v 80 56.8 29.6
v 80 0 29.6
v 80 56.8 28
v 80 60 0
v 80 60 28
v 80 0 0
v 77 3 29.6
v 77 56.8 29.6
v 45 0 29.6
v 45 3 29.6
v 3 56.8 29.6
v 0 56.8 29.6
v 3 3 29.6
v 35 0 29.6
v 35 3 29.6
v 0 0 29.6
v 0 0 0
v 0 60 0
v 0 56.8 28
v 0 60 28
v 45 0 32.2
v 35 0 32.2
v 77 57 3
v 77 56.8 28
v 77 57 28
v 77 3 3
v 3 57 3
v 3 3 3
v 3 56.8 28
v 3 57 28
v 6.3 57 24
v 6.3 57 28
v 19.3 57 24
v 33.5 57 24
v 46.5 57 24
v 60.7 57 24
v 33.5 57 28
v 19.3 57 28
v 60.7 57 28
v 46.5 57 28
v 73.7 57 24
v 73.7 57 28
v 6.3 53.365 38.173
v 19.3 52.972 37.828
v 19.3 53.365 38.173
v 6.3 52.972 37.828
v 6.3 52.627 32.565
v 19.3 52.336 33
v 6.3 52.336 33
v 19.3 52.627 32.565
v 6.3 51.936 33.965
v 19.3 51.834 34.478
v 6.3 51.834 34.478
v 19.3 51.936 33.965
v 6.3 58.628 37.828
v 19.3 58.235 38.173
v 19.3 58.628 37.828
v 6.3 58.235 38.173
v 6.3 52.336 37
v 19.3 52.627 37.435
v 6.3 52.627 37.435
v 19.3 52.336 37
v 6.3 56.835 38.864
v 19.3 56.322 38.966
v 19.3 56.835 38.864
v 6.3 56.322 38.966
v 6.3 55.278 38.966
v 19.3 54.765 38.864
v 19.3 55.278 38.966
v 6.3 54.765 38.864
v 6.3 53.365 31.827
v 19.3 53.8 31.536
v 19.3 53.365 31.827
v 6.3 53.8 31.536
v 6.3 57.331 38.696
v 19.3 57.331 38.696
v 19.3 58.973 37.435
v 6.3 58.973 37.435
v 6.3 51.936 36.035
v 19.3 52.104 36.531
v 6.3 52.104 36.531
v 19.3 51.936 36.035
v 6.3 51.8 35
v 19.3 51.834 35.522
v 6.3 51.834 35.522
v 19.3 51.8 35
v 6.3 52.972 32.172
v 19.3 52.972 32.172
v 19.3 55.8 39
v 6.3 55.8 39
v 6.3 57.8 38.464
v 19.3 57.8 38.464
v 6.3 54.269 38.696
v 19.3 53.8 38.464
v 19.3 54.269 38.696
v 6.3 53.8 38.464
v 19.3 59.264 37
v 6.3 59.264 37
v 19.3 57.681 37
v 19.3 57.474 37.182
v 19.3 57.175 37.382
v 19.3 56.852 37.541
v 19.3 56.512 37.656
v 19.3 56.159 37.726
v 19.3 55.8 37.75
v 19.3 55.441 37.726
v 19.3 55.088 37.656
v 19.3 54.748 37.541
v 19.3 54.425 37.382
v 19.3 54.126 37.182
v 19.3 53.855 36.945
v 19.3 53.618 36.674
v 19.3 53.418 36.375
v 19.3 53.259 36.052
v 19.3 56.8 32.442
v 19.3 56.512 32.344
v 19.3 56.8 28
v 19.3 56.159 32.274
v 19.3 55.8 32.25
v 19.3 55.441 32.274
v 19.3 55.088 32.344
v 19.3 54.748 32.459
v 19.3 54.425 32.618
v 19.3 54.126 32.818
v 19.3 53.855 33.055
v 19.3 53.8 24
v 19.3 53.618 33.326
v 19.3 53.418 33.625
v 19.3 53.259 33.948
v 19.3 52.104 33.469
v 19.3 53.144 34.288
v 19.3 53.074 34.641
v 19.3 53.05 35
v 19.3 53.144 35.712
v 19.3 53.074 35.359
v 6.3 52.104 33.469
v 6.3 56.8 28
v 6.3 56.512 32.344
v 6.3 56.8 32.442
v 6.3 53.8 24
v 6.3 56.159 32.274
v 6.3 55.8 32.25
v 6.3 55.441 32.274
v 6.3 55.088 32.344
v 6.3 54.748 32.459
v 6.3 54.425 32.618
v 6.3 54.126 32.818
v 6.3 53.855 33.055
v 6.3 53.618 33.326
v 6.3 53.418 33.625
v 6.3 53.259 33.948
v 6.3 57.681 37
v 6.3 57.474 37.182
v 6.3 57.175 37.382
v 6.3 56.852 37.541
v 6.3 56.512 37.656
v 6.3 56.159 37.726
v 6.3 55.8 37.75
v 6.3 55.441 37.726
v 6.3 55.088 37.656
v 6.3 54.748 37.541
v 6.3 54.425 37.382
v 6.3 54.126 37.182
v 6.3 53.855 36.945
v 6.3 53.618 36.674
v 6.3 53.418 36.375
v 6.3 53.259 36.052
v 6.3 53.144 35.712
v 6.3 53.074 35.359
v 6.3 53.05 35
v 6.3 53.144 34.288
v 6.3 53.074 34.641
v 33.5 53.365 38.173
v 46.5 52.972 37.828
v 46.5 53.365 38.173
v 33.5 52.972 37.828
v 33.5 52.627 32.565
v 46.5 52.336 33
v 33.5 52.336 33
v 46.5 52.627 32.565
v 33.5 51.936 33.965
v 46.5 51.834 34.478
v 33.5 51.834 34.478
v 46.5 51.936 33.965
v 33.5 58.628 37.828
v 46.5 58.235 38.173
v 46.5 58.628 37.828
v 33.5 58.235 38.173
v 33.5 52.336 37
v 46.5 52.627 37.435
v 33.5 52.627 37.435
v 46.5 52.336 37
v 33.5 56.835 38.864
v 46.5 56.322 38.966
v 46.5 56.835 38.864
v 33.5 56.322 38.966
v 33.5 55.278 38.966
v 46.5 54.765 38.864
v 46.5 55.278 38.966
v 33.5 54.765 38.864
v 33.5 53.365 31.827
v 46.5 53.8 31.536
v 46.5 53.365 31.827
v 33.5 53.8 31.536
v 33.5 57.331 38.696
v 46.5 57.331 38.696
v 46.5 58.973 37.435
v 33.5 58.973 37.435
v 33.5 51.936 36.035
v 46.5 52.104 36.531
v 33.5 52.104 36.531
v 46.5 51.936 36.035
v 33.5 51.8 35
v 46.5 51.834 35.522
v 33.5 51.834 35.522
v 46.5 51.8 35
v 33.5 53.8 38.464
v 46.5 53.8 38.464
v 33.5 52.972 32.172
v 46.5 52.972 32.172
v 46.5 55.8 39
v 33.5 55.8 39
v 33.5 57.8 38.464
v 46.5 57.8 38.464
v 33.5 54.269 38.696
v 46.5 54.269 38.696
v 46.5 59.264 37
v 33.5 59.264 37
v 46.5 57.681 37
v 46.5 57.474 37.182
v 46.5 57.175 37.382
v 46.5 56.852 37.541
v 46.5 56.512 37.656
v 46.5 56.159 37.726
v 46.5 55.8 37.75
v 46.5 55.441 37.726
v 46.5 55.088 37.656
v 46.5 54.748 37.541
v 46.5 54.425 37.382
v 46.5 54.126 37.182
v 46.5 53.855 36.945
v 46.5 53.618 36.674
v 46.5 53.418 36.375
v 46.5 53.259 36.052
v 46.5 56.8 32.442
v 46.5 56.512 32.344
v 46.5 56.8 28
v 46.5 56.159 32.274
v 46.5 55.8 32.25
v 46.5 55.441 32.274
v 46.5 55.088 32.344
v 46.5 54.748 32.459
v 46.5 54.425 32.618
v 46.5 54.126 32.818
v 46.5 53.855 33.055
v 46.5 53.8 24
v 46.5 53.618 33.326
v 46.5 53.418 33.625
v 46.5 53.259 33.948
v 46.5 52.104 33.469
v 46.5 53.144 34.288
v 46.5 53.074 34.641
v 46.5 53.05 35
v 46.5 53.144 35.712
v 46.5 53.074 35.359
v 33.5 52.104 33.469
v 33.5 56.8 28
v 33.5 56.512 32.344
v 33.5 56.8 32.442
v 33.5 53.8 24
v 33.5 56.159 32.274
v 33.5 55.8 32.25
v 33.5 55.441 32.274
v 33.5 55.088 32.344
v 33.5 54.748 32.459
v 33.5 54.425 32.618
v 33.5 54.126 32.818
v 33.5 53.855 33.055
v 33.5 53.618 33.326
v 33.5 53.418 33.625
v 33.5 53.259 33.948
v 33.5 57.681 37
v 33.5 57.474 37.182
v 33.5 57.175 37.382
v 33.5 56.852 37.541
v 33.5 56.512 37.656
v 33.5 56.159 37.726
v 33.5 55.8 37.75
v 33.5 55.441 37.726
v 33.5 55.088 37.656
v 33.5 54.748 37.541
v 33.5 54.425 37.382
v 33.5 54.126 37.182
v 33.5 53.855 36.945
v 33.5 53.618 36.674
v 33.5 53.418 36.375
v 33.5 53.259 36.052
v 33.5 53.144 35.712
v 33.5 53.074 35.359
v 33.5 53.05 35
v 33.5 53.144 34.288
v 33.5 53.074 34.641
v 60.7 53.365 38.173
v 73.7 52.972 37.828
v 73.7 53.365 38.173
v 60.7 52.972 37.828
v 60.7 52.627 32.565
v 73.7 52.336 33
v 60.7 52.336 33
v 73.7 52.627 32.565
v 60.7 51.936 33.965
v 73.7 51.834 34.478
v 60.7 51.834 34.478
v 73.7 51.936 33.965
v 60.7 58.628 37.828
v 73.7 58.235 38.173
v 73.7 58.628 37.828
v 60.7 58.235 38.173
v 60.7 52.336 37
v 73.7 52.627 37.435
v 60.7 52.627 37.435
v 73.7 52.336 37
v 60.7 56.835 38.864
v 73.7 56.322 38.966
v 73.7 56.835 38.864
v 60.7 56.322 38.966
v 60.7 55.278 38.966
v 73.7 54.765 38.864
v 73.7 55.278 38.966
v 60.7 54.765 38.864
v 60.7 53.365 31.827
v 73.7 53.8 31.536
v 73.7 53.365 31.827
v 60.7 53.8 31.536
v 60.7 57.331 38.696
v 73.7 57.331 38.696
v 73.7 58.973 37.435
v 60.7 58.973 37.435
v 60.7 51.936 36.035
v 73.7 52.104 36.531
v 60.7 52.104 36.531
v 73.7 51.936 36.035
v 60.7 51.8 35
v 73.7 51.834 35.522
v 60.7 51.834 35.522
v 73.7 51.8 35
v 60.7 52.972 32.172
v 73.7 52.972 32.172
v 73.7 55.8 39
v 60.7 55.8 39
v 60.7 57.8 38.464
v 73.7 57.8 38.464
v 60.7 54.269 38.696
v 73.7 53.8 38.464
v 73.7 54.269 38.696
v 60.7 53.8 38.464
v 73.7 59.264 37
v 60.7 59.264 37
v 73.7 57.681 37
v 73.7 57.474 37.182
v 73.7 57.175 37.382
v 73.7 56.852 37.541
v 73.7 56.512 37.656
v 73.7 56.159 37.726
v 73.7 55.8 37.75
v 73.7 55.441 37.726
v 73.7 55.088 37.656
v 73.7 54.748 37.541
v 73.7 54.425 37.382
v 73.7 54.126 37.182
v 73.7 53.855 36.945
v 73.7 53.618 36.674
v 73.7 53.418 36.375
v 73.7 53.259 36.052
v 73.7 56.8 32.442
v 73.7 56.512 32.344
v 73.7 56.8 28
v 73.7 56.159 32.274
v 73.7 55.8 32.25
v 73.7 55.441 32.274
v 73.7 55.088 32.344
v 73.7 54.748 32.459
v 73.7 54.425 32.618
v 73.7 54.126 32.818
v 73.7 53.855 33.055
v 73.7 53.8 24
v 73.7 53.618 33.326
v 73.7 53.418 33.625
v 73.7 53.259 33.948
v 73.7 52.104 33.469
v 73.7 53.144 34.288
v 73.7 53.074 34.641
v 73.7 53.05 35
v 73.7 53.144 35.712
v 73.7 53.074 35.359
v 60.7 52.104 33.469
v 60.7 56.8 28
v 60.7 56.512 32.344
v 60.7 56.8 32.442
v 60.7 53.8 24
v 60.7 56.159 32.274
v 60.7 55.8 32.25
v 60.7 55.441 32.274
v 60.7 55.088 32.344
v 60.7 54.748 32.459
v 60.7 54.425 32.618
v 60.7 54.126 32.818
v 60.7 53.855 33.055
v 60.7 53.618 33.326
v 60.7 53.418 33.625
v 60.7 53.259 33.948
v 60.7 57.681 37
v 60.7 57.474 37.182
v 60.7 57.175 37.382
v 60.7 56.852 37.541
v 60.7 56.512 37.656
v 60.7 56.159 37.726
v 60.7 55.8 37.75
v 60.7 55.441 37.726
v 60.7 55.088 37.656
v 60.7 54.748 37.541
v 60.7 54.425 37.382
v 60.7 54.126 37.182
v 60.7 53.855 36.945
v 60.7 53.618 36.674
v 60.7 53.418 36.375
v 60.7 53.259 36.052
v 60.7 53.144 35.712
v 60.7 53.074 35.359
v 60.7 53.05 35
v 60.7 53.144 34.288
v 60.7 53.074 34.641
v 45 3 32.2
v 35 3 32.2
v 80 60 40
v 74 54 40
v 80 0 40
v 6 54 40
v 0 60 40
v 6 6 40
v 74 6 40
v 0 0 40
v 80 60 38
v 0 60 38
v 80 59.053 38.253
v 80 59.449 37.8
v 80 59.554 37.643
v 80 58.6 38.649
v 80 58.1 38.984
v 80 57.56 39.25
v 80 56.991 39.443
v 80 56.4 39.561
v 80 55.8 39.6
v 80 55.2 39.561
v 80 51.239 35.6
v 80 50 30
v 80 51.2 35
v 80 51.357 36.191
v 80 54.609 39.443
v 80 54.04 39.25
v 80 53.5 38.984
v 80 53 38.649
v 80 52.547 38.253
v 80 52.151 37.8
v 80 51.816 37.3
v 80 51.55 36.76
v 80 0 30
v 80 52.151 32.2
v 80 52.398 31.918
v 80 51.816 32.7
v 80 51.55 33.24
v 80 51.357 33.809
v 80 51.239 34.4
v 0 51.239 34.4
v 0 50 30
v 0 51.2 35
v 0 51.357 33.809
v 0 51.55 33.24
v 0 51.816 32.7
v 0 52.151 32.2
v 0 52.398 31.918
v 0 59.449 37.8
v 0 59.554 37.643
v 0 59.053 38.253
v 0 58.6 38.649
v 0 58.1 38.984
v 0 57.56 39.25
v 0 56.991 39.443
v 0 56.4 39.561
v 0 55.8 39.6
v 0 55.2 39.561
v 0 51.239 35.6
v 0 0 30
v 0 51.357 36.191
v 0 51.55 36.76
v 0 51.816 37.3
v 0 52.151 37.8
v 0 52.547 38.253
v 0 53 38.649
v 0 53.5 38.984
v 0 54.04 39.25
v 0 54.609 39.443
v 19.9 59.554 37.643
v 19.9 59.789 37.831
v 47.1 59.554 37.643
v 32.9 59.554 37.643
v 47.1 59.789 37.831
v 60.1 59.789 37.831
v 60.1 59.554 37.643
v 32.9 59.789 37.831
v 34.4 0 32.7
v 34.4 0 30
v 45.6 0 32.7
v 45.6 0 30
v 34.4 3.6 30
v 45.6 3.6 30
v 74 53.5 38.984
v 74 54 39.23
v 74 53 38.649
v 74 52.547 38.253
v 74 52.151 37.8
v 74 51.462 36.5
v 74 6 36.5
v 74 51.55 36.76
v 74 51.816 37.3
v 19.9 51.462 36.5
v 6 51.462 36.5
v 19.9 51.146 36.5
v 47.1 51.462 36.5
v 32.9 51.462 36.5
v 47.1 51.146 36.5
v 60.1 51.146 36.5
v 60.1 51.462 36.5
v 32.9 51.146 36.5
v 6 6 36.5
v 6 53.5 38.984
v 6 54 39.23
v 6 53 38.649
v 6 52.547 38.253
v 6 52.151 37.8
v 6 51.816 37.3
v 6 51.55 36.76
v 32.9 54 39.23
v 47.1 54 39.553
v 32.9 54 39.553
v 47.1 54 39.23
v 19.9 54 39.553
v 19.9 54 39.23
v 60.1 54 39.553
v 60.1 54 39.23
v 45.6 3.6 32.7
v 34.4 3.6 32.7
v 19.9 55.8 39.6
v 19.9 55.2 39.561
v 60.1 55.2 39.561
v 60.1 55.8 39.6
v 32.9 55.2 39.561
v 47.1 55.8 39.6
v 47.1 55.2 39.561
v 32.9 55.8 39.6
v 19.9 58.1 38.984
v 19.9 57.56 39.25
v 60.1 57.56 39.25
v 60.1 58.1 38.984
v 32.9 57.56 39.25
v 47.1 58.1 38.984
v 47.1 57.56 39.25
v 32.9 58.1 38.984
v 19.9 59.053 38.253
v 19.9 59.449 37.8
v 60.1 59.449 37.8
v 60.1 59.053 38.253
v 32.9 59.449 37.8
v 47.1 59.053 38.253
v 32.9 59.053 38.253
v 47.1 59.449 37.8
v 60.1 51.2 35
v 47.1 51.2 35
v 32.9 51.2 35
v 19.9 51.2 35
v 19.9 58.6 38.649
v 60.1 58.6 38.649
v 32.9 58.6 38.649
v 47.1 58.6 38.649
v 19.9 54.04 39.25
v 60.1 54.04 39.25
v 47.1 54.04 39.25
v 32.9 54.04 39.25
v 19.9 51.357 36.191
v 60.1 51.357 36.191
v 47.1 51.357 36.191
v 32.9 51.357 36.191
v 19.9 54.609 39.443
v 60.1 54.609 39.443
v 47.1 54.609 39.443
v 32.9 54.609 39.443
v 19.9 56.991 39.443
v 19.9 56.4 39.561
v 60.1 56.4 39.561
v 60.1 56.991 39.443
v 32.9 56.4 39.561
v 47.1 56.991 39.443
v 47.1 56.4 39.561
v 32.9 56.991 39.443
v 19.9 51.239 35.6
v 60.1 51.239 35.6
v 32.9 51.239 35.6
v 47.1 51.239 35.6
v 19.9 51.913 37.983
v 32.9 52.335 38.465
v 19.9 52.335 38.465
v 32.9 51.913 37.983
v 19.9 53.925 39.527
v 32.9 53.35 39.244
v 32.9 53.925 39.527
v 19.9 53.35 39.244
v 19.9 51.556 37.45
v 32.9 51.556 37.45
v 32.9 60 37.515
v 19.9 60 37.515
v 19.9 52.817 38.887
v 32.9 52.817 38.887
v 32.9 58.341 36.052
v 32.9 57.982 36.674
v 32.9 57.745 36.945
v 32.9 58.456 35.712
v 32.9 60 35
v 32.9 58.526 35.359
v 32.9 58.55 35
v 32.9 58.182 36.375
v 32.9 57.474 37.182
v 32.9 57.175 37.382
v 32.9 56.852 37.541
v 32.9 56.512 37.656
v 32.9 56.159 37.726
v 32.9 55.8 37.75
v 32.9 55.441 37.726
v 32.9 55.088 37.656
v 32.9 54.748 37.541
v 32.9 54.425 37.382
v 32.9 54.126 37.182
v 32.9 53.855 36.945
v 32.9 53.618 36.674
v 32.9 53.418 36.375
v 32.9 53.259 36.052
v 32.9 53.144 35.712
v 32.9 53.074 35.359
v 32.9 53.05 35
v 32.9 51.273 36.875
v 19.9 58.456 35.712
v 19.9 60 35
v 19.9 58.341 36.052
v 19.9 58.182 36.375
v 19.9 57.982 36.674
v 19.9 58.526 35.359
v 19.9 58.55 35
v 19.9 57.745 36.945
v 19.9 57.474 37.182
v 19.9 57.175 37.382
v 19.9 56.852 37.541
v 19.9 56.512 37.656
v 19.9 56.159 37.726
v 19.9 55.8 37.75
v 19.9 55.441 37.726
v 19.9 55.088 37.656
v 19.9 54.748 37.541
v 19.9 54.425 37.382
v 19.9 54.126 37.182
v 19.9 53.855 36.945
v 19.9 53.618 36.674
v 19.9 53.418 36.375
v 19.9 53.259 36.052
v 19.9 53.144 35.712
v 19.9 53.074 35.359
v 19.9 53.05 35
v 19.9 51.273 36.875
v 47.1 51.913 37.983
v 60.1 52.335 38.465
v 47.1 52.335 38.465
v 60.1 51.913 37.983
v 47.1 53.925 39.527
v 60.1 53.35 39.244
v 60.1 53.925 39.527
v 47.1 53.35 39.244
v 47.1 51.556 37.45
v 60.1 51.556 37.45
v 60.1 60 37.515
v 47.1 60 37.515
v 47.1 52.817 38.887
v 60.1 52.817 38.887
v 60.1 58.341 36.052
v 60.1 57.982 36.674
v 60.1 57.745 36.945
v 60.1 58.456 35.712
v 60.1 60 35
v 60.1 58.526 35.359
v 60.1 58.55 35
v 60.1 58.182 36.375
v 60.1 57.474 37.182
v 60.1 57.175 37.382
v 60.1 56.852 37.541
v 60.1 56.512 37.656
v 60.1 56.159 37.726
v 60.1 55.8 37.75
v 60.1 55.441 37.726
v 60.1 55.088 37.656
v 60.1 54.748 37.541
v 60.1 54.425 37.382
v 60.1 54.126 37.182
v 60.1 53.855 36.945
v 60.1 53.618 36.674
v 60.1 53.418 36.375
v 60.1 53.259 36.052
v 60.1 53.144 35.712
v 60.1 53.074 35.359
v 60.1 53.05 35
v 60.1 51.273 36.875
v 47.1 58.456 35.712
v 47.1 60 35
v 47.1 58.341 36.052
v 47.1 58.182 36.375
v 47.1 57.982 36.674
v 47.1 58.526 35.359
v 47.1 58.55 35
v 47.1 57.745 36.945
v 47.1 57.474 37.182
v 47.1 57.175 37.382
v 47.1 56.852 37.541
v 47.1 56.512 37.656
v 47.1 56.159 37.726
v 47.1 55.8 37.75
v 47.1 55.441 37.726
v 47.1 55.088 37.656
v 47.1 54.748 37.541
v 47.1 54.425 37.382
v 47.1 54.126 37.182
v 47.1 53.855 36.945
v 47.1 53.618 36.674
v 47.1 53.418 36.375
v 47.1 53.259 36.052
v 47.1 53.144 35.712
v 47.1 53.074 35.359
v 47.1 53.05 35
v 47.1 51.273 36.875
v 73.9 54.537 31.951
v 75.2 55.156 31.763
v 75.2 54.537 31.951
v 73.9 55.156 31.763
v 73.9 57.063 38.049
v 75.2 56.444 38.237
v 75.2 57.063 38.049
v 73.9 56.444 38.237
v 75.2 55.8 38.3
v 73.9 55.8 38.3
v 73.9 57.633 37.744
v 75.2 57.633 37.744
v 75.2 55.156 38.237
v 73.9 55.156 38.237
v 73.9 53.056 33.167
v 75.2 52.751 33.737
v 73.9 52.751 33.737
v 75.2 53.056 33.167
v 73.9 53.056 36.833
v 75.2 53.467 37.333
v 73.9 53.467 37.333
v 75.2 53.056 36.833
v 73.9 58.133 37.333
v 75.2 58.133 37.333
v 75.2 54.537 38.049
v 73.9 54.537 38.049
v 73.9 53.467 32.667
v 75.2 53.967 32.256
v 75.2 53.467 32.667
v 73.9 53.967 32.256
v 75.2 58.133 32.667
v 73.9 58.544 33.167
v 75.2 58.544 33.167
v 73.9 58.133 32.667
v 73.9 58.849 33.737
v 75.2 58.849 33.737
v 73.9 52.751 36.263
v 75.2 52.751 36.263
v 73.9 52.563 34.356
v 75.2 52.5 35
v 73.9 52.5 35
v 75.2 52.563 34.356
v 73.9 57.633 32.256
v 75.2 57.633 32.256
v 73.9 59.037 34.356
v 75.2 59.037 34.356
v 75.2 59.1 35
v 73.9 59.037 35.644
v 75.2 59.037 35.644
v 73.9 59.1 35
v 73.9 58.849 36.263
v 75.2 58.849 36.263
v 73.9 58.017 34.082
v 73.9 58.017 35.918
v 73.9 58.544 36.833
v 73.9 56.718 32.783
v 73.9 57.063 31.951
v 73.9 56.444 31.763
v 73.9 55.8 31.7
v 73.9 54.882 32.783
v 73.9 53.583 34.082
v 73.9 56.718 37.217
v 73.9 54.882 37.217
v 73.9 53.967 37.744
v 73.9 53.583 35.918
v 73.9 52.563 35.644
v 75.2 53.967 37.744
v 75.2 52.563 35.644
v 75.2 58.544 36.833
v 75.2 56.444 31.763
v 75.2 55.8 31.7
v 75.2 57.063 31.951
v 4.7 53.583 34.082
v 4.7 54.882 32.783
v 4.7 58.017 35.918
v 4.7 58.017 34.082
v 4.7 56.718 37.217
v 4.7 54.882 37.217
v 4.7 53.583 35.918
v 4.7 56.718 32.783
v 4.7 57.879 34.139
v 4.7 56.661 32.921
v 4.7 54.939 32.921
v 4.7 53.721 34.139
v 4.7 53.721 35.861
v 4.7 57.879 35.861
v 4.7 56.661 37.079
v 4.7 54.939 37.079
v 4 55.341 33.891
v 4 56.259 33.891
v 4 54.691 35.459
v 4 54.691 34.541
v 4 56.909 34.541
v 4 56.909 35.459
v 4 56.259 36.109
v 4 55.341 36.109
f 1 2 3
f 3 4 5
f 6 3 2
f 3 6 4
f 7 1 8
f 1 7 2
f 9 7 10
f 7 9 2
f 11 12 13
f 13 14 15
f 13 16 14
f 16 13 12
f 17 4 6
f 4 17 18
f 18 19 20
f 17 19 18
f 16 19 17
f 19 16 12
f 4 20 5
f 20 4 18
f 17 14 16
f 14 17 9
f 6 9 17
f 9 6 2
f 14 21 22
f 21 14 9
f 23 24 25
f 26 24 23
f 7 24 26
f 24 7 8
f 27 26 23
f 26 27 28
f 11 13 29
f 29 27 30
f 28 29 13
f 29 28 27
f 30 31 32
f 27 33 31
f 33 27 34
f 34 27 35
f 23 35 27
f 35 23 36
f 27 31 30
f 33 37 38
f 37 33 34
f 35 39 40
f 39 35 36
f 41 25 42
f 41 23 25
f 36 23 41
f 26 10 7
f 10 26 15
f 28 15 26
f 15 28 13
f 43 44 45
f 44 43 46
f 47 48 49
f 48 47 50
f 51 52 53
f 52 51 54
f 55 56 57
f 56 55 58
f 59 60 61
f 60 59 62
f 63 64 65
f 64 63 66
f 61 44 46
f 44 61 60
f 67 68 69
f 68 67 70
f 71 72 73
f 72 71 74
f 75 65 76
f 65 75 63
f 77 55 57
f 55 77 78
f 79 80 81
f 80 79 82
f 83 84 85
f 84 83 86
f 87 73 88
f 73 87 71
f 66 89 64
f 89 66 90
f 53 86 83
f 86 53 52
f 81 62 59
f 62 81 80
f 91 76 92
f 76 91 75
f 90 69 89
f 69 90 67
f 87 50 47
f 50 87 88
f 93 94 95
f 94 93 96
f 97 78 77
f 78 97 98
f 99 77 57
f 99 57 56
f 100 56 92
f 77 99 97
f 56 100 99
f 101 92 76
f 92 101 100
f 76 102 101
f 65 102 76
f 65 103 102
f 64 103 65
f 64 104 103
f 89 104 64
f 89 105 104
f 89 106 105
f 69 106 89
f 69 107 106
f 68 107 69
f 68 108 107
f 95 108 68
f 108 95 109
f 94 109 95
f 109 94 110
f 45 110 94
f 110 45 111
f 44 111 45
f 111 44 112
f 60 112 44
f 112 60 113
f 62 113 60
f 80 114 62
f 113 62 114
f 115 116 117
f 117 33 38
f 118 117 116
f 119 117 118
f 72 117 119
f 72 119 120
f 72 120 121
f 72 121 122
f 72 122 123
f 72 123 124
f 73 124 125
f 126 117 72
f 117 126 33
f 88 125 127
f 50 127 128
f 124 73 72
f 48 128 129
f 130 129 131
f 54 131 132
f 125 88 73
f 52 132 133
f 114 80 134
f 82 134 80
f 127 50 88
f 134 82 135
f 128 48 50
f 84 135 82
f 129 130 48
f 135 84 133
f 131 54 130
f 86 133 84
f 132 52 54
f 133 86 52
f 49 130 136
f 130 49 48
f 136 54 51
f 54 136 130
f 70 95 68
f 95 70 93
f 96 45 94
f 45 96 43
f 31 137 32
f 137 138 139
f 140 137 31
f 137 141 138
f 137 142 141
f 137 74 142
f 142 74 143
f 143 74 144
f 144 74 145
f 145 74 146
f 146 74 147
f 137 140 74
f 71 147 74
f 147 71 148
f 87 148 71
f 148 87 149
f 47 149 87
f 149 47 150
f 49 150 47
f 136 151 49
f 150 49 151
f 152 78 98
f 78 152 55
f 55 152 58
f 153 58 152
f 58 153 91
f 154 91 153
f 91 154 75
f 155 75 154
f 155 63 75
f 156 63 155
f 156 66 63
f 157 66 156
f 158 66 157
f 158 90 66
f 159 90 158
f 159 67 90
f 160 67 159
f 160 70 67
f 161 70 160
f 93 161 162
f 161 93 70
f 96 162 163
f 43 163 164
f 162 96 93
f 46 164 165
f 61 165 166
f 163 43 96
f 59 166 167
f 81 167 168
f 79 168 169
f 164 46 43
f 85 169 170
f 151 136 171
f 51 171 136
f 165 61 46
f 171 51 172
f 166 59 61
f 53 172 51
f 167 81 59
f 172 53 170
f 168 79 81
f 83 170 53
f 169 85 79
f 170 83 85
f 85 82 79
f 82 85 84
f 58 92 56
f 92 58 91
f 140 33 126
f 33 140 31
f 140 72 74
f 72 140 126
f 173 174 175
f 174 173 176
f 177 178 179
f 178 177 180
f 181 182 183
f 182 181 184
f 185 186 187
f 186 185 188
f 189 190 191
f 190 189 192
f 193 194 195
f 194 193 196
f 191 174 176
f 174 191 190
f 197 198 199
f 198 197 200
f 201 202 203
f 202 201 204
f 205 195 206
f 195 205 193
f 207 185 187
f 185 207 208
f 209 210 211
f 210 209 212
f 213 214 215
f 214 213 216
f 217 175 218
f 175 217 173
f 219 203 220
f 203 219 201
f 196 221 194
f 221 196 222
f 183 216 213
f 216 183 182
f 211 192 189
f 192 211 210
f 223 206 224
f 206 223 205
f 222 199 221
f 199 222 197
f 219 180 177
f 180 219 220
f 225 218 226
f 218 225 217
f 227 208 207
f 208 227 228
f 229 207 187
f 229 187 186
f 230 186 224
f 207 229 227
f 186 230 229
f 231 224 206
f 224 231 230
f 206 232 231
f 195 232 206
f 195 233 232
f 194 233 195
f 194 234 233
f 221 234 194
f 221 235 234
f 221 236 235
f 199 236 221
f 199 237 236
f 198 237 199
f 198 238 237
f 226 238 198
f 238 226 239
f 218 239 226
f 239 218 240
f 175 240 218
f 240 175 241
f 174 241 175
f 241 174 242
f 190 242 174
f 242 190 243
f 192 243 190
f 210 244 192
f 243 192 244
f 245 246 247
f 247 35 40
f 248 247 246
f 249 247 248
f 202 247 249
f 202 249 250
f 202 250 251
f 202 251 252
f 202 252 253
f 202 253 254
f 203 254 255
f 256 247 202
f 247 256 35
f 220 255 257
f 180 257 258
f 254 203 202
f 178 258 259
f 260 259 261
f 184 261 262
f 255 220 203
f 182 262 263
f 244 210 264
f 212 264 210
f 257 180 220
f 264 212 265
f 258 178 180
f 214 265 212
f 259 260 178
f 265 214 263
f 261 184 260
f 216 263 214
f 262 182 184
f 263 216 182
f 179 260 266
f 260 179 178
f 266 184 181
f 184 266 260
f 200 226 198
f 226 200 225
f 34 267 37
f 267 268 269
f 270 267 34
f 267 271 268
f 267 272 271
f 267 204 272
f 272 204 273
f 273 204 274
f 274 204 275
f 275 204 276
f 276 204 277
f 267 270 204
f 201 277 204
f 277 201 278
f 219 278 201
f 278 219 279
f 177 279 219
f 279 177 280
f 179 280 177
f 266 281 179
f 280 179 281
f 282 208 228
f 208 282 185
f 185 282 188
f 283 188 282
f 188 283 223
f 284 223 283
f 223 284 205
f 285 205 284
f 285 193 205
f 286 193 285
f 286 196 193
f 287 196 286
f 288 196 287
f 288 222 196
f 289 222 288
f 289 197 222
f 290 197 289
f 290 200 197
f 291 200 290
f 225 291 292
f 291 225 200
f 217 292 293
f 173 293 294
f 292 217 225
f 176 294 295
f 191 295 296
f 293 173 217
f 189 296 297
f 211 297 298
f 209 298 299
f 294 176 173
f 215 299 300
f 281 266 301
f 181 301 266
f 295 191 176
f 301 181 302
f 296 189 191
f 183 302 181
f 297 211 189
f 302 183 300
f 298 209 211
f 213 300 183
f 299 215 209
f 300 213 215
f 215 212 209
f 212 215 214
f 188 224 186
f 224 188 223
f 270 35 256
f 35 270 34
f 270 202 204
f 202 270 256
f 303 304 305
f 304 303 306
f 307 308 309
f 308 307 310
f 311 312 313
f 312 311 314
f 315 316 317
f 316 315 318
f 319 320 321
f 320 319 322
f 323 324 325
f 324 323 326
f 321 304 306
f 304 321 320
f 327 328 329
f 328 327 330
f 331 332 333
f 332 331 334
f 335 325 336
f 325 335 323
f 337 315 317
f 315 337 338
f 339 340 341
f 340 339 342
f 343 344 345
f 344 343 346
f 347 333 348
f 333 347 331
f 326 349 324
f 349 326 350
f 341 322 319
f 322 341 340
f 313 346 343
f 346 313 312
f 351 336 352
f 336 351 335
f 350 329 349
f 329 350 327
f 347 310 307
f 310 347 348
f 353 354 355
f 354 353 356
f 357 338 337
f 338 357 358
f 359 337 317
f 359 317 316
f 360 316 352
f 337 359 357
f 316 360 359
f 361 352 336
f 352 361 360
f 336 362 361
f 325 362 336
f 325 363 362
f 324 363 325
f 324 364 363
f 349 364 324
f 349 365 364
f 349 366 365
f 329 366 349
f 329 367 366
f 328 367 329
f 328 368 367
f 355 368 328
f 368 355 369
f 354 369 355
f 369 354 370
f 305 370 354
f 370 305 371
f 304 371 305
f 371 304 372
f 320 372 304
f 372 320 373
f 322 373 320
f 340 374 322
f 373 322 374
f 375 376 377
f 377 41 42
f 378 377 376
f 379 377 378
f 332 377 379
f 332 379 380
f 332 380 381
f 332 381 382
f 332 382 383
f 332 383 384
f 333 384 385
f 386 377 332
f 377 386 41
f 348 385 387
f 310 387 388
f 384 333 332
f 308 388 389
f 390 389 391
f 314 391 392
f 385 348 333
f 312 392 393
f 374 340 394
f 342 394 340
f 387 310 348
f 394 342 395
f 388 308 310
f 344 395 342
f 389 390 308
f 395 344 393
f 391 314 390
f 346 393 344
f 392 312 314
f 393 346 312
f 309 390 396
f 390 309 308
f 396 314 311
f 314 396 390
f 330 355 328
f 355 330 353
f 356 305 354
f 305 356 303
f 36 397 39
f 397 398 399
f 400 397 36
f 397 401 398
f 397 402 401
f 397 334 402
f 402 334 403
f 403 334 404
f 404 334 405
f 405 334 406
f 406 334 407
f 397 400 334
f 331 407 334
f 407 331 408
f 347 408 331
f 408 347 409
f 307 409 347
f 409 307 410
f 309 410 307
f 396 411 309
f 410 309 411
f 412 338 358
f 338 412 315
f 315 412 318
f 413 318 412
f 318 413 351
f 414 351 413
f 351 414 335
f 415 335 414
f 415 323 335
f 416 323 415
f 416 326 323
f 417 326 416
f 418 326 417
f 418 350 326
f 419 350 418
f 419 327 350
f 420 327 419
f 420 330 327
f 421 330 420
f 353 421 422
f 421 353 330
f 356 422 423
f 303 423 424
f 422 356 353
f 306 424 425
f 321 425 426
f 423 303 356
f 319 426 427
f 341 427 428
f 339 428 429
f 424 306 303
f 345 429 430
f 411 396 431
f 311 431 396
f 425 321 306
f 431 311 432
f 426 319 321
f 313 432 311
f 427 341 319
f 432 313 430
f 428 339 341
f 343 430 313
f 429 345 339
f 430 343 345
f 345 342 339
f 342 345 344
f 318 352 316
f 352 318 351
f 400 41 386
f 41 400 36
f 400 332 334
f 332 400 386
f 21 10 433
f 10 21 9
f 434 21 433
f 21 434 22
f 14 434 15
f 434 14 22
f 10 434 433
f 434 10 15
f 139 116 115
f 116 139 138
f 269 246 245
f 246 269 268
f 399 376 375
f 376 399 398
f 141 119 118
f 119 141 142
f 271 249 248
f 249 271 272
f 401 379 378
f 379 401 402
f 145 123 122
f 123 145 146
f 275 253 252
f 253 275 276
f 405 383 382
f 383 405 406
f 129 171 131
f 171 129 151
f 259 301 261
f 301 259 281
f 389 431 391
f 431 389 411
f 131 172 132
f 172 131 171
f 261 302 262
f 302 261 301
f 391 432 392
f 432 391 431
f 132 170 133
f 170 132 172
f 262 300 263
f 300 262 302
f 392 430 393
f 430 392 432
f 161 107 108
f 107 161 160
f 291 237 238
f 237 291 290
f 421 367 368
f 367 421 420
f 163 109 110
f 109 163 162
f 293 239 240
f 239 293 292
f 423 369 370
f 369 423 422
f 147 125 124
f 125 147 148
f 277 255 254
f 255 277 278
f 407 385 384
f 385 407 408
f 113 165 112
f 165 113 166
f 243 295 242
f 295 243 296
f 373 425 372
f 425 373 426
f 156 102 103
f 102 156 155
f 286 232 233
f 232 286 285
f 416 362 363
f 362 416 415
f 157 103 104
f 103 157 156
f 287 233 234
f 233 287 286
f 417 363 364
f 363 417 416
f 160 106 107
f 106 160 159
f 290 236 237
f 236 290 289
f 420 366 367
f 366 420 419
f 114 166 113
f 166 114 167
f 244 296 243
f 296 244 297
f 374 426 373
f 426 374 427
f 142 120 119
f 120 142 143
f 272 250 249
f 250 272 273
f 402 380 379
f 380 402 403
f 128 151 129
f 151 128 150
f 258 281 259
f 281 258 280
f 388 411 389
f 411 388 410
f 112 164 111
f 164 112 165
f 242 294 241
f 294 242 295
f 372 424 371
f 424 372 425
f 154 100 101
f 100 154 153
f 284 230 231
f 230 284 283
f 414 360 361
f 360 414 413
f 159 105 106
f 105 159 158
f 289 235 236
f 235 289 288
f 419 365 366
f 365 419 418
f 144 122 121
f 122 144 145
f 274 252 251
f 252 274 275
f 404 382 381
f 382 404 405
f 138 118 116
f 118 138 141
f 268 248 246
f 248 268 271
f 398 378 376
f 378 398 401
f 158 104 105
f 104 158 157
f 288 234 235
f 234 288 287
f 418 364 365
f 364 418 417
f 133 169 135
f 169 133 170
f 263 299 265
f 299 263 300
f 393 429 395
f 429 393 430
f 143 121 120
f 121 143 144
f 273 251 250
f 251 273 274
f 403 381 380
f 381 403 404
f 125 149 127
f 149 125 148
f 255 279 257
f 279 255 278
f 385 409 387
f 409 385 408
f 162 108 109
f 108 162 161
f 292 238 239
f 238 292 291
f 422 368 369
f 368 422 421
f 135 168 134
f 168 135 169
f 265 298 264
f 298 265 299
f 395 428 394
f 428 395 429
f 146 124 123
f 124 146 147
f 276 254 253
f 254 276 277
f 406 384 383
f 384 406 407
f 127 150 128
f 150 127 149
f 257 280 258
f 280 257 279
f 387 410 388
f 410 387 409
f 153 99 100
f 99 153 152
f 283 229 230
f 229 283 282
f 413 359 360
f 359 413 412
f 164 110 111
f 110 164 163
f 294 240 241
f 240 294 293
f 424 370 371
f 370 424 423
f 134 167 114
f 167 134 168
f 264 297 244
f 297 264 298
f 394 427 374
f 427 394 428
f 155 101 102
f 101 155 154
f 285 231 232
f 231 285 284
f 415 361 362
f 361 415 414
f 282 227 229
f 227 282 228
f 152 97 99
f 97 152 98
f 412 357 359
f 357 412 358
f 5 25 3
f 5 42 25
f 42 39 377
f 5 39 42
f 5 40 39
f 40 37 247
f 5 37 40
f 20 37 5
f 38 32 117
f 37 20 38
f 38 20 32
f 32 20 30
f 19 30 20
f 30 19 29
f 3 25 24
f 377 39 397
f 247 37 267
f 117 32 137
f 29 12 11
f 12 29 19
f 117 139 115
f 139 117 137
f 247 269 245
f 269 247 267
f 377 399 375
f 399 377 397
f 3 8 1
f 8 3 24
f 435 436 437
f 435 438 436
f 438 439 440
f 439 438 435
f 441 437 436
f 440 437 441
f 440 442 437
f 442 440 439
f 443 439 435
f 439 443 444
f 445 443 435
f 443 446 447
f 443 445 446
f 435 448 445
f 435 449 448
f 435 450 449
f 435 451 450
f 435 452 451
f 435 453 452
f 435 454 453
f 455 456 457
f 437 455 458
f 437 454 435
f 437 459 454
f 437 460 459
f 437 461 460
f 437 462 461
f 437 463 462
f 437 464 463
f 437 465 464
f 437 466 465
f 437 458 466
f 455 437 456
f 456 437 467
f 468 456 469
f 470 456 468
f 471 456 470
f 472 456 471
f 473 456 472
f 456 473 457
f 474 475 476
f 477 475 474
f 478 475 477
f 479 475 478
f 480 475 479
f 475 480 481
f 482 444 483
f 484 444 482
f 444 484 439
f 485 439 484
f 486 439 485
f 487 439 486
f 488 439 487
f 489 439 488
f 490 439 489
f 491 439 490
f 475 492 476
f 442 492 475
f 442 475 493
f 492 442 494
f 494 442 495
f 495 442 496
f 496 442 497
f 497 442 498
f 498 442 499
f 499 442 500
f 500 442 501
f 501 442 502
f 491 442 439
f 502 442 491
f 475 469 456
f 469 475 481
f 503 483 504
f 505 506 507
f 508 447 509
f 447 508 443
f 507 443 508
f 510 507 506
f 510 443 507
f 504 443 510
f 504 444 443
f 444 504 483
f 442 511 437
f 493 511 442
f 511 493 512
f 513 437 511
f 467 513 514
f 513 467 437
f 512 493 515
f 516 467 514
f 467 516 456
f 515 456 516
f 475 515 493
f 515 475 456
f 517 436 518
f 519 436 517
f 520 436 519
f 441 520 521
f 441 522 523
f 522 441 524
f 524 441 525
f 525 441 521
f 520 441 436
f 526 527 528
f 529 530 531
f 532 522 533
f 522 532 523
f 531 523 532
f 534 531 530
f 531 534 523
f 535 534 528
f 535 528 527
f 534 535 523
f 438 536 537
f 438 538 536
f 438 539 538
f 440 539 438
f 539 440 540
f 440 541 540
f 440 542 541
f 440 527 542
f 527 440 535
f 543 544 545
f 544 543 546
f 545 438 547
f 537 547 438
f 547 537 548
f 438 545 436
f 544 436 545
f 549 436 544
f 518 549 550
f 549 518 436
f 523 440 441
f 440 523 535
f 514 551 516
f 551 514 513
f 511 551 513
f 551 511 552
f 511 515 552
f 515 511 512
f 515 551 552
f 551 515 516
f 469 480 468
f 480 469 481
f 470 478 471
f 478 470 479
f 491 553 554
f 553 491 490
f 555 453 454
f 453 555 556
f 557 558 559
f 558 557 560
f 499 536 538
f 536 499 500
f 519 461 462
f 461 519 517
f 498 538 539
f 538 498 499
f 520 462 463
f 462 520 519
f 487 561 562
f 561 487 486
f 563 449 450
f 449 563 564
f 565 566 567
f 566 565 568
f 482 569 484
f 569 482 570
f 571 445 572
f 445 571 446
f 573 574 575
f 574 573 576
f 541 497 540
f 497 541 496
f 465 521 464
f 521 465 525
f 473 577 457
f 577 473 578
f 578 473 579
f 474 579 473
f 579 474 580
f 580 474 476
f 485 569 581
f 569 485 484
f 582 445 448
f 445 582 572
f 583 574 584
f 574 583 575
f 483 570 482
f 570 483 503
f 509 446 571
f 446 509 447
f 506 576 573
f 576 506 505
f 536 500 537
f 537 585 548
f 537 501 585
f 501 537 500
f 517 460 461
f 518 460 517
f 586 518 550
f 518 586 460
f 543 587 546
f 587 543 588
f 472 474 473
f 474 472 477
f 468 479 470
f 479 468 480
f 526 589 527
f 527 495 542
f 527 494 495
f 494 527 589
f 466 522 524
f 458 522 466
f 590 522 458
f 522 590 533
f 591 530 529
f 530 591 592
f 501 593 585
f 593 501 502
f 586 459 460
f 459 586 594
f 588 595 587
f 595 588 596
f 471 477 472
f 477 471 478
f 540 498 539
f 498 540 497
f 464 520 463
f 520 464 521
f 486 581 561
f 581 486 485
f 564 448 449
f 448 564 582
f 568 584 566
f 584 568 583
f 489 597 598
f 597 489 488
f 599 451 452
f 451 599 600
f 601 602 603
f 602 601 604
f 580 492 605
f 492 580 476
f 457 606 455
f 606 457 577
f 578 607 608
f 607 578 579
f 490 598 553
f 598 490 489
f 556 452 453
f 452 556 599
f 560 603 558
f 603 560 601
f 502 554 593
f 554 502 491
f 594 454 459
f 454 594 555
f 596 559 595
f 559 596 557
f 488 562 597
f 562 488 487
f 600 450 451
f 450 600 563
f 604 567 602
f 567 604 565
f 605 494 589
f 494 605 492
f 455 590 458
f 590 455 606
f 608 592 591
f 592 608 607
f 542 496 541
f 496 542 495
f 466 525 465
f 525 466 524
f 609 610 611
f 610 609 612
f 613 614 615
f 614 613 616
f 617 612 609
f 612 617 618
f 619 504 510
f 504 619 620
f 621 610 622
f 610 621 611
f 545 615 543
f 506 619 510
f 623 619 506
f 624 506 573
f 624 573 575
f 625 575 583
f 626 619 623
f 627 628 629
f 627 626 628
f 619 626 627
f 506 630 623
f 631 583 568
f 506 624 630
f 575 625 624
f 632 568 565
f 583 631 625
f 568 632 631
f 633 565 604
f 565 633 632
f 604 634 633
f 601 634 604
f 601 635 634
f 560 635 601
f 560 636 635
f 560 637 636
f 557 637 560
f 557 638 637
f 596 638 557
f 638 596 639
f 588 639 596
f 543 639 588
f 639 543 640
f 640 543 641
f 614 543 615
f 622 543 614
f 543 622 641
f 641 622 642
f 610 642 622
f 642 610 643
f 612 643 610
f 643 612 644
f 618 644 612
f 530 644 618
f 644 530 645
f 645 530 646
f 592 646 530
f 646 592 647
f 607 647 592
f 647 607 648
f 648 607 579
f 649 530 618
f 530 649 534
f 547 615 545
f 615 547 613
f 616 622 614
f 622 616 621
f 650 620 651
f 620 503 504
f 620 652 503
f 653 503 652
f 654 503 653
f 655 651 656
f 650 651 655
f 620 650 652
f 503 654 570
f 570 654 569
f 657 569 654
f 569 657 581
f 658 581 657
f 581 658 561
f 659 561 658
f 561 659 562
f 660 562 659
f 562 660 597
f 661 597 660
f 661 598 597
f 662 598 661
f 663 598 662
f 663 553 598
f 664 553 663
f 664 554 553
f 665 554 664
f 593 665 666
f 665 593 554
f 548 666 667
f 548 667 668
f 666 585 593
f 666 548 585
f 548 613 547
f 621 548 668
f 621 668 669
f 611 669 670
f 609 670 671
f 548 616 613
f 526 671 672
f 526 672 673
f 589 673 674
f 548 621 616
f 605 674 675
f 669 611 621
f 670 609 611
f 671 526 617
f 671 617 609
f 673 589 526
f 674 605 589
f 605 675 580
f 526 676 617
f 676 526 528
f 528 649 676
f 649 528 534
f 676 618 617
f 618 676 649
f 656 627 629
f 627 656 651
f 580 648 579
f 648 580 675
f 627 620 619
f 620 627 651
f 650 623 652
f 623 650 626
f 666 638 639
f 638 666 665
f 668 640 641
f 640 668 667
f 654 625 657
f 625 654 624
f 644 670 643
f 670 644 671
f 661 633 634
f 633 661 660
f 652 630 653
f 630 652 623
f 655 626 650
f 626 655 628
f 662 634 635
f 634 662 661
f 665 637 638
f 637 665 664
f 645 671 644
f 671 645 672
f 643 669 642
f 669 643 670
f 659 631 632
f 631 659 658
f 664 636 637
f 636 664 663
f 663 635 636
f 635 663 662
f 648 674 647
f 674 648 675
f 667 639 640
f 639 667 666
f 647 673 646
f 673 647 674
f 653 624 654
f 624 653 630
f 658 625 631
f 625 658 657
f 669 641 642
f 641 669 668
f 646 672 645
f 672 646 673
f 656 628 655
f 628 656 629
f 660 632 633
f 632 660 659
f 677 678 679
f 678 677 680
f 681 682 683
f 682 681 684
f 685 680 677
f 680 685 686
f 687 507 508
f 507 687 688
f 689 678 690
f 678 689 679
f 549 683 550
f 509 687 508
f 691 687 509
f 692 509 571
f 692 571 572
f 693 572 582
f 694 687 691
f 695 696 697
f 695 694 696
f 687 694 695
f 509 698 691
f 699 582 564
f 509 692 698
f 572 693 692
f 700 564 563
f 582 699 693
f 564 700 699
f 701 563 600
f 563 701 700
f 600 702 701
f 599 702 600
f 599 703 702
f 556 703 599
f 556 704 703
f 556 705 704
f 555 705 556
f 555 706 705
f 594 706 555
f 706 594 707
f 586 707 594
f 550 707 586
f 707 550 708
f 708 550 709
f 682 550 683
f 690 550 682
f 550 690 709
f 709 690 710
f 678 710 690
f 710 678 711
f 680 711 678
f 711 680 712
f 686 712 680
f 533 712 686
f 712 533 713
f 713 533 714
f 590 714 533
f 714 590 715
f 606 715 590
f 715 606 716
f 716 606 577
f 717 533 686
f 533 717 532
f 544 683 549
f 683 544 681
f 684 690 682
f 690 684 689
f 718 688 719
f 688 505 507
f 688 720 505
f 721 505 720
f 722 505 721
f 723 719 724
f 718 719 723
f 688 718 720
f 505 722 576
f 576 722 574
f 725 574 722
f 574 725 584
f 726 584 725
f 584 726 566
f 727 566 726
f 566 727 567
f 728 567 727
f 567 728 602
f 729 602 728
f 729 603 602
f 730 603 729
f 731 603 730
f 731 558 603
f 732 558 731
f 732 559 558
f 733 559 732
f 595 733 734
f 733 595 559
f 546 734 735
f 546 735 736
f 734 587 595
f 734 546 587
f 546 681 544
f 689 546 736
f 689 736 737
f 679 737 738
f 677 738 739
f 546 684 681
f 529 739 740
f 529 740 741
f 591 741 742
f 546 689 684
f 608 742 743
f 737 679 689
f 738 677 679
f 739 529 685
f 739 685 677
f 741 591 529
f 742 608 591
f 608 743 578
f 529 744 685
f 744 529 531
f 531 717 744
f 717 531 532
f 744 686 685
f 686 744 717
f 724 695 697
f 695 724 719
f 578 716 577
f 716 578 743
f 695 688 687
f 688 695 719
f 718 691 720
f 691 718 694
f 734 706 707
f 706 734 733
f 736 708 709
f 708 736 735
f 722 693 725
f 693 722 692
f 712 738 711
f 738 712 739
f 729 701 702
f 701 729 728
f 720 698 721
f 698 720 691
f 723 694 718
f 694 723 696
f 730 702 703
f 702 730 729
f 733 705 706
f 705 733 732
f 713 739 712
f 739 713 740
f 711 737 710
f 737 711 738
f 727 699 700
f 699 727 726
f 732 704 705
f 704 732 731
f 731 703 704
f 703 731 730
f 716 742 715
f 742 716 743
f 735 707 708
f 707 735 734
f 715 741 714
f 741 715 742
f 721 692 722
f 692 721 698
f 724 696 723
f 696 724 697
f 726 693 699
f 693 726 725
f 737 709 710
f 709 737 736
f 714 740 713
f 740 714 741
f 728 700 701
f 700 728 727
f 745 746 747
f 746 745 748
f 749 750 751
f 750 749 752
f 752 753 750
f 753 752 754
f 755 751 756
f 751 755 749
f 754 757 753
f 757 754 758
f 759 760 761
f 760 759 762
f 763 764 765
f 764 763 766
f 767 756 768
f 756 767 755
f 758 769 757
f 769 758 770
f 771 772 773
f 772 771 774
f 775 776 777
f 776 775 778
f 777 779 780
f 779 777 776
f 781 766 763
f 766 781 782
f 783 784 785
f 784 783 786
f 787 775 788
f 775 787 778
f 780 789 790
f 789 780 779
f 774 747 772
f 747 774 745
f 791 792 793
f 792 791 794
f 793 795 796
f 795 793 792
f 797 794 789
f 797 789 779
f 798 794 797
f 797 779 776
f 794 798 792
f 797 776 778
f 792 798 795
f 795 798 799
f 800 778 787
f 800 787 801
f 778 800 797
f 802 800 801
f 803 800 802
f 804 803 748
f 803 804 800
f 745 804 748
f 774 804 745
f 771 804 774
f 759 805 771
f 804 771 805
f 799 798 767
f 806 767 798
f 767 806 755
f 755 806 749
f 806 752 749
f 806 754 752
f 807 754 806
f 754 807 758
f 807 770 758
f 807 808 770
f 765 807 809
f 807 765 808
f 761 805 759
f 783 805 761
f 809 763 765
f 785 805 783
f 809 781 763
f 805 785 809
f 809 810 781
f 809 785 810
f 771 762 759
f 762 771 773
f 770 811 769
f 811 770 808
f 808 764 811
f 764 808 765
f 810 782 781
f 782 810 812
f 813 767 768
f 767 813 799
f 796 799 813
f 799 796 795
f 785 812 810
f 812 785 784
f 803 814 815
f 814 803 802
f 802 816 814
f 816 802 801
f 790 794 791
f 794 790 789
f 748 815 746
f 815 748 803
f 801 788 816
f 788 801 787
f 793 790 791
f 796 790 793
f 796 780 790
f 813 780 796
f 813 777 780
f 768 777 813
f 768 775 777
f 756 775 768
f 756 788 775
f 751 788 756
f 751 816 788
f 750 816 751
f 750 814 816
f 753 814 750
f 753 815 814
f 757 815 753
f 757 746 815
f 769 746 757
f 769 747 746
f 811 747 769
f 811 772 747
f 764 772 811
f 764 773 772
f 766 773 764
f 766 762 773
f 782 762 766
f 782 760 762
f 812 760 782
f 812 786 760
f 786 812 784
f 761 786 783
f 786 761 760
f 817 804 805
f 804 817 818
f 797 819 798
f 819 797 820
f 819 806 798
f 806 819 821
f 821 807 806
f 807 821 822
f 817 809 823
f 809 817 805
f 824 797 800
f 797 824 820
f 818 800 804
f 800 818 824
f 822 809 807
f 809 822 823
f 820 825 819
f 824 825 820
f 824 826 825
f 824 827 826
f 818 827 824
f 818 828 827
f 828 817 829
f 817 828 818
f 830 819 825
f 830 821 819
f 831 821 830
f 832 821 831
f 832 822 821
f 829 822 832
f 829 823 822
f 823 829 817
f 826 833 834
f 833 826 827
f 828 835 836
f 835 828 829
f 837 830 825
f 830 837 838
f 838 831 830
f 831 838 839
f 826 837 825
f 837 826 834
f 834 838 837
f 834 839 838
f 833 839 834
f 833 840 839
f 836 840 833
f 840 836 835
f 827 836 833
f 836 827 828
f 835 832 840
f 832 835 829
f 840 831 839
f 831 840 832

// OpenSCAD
// Print-in-place hinged box, 80 x 60 x 40 mm closed.
// Printed closed in PLA (Bambu A1, 0.4 nozzle): base, lid and a captive
// hinge pin are separate bodies with 0.35-0.6 mm clearances, so the hinge
// breaks free by hand.  No supports: the lid underside bridges the cavity,
// the hinge barrels/pin use faceted (octagonal) lower surfaces, and all
// other downward faces are short bridges or rest on the body below.

/* [Part] */
part = "assembly"; // [assembly, box, lid, pin]

/* [Dimensions] */
box_w = 80;          // X, outside
box_d = 60;          // Y, outside (front y=0, back y=60)
box_h = 29.6;        // base height to its rim
lid_h = 10;          // lid height; lid bottom at z=30 (0.4 gap)
lid_z = 30;
wall = 3;
floor_t = 3;
total_h = 40;

hinge_y = 55.8;      // hinge axis, assembly coords
hinge_z = 35;
barrel_r = 4.0;
pin_r = 2.4;         // octagon circumradius
bore_r = 2.75;       // pin_r + 0.35 radial clearance
relief_r = 4.6;      // barrel_r + 0.6

// Alternating knuckles along the back edge (x intervals), 0.6 mm end gaps.
box_segs  = [[6.3, 19.3], [33.5, 46.5], [60.7, 73.7]];
lid_segs  = [[19.9, 32.9], [47.1, 60.1]];

cadverify_only = "";
module instance(name, part_name, unit = 1) {
    echo(cadverify_instance = [name, part_name, unit]);
    if (cadverify_only == "" || cadverify_only == name) children();
}

// ---------------------------------------------------------------- base (box)
module box_main() {
    difference() {
        union() {
            // shell: outer block minus open-top cavity
            difference() {
                cube([box_w, box_d, box_h]);
                translate([wall, wall, floor_t]) cube([box_w - 2 * wall, box_d - 2 * wall, box_h]);
            }
            // hinge knuckles (base) + support posts down to the back wall
            for (s = box_segs) {
                translate([s[0], hinge_y, hinge_z]) rotate([0, 90, 0])
                    cylinder(h = s[1] - s[0], r = barrel_r, $fn = 48);
                translate([s[0], 53.8, 24]) cube([s[1] - s[0], 6.2, 11.5]);
            }
            // front catch tooth (enters the socket in the lid)
            translate([35, 0, box_h]) cube([10, wall, 2.6]);
        }
        // pin bore through the base knuckles
        translate([-1, hinge_y, hinge_z]) rotate([0, 90, 0])
            cylinder(h = box_w + 2, r = bore_r, $fn = 48);
        // swing clearance notch: rear strip of wall/posts above z=28,
        // behind y=56.8, so the lid's rear lip clears it past 90 deg
        translate([-1, 56.8, 28]) cube([box_w + 2, 5, 9]);
    }
}

// ---------------------------------------------------------------- lid (local: z 0..10, hinge axis at z=5)
module lid_main() {
    union() {
        difference() {
            union() {
                // main slab, side profile (Y-Z) extruded along X.
                // Rear lower edge chamfered 50,0 -> 60,8 so the slab
                // swings clear of the base back wall.
                rotate([0, 90, 0])
                    linear_extrude(height = box_w)
                        polygon(points = [[0, 0], [0, 50], [-8, 60], [-10, 60], [-10, 0]]);
                // hinge knuckles (lid)
                for (s = lid_segs)
                    translate([s[0], hinge_y, 5]) rotate([0, 90, 0])
                        cylinder(h = s[1] - s[0], r = barrel_r, $fn = 48);
            }
            // recessed panel in the top face
            translate([6, 6, 6.5]) cube([68, 48, 4]);
            // front catch socket (tooth: x35..45, z assy 29.6..32.2)
            translate([34.4, -1, -0.5]) cube([11.2, 4.6, 3.2]);
            // clearance tunnel for the base knuckles / pin
            translate([-1, hinge_y, 5]) rotate([0, 90, 0])
                cylinder(h = box_w + 2, r = relief_r, $fn = 48);
            // pin bore through the lid knuckles
            translate([-1, hinge_y, 5]) rotate([0, 90, 0])
                cylinder(h = box_w + 2, r = bore_r, $fn = 48);
        }
        // webs joining lid knuckles to the slab: upper half-discs r=4.9
        // (stay above z=30.1 in assembly, clear of the base rim at 29.6)
        for (s = lid_segs)
            difference() {
                intersection() {
                    translate([s[0], hinge_y, 5]) rotate([0, 90, 0])
                        cylinder(h = s[1] - s[0], r = 4.9, $fn = 48);
                    translate([s[0], hinge_y - 10, 5]) cube([s[1] - s[0], 20, 5]);
                    translate([s[0], 0, 0]) cube([s[1] - s[0], box_d, lid_h]);
                }
                translate([s[0] - 1, hinge_y, 5]) rotate([0, 90, 0])
                    cylinder(h = s[1] - s[0] + 2, r = bore_r, $fn = 48);
            }
    }
}

// ---------------------------------------------------------------- pin
// Centred on its axis, local +Z from head (z=0) to tip (z=71.2).
module pin_geom() {
    union() {
        cylinder(h = 1.3, r = 3.3, $fn = 32);                    // head
        translate([0, 0, 1.0]) rotate([0, 0, 22.5])
            cylinder(h = 69.5, r = pin_r, $fn = 8);              // octagonal shaft
        translate([0, 0, 70.4]) rotate([0, 0, 22.5])
            cylinder(h = 0.8, r1 = pin_r, r2 = 1.2, $fn = 8);    // lead-in tip
    }
}
module pin_part() { translate([3.3, 3.3, 0]) pin_geom(); }

// ---------------------------------------------------------------- output
if (part == "box") {
    echo(cadverify_spec = [
        ["bounds", [[0, 0, 0], [box_w, box_d, hinge_z + barrel_r]]],
        ["bodies", 1],
        ["copies", 1],
        ["support_faces", [["bed", "-z", 4000]]],
        ["overhangs_allowed", [["hinge knuckles and pin bore print in place; faceted bore ceiling is a short internal bridge", [[5, 51, 30], [75, 60, 39.5]]], ["knuckle support ledge underside, 3.2 mm protrusion bridging to the back wall", [[5, 53, 23], [75, 58, 25]]]]],
        ["details", [
            ["cavity", "void", [[4, 4, 10], [76, 53, 29]], 0.95],
            ["front_wall", "thickness", [40, -1, 15], [0, 1, 0], 3],
            ["floor", "thickness", [40, 30, -1], [0, 0, 1], 3],
            ["box_knuckle", "material", [[7, 52, 33.5], [18, 53.8, 36.5]], 0.6],
            ["pin_bore", "void", [[8, 54.9, 34.1], [17, 56.7, 35.9]], 0.9],
            ["catch_tooth", "material", [[36, 0.5, 30], [44, 2.5, 32]], 0.85],
            ["hinge_knuckles", "view", [[4, 50, 28], [76, 60, 39.5]]]
        ]]
    ]);
    box_main();
} else if (part == "lid") {
    echo(cadverify_spec = [
        ["bounds", [[0, 0, 0], [box_w, box_d, lid_h]]],
        ["bodies", 1],
        ["copies", 1],
        ["support_faces", [["print_face", "-z", 3000]]],
        ["overhangs_allowed", [["lid hinge relief, knuckle bores and rear swing chamfer print in place around pin and box knuckles; ceilings are short internal bridges and the chamfer is 51 deg", [[0, 49, 0], [80, 60, 10]]], ["catch socket ceiling, 11 mm bridge across the socket", [[33, 0, 2], [47, 4, 3.5]]]]],
        ["details", [
            ["top_pocket", "void", [[7, 7, 6.6], [73, 53, 9.9]], 0.95],
            ["lid_slab", "thickness", [40, 30, 9], [0, 0, -1], 6.5],
            ["lid_knuckle", "material", [[21, 52, 3.5], [32, 53.8, 6.5]], 0.3],
            ["pin_bore", "void", [[22, 55.4, 4.6], [31, 56.2, 5.4]], 0.45],
            ["catch_socket", "void", [[35, 0.5, 0.2], [45, 2.5, 2.5]], 0.9],
            ["hinge_knuckles", "view", [[4, 50, 0], [76, 60, 10]]]
        ]]
    ]);
    lid_main();
} else if (part == "pin") {
    echo(cadverify_spec = [
        ["bounds", [[0, 0, 0], [6.6, 6.6, 71.2]]],
        ["bodies", 1],
        ["copies", 1],
        ["support_faces", [["head_base", "-z", 30]]],
        ["overhangs_allowed", []],
        ["details", [
            ["pin_shaft", "material", [[2, 2, 10], [4.6, 4.6, 20]], 0.9],
            ["pin_head", "material", [[1, 1, 0.1], [5.6, 5.6, 1.2]], 0.75],
            ["pin_length", "thickness", [1.2, 3.3, 72], [0, 0, -1], 71.2],
            ["pin_head_view", "view", [[0, 0, 0], [6.6, 6.6, 2]]]
        ]]
    ]);
    pin_part();
} else if (part == "assembly") {
    echo(cadverify_spec = [
        ["bounds", [[0, 0, 0], [box_w, box_d, total_h]]],
        ["support_faces", [["bed", "-z", 4000]]],
        ["allowed_interferences", []],
        ["motions", [
            ["lid_swing", ["lid"], "rotate", [0, hinge_y, hinge_z], [-1, 0, 0], [0, 110]]
        ]],
        ["assembly_order", [
            [["base"], [0, 0, 0]],
            [["pin"], [-1, 0, 0]],
            [["lid"], [0, -1, 0], ["rotate", [0, hinge_y, hinge_z], [1, 0, 0], 110]]
        ]]
    ]);
    instance("base", "box") box_main();
    instance("lid", "lid") translate([0, 0, lid_z]) lid_main();
    instance("pin", "pin") translate([75.2, hinge_y, hinge_z]) rotate([0, -90, 0]) pin_geom();
}
